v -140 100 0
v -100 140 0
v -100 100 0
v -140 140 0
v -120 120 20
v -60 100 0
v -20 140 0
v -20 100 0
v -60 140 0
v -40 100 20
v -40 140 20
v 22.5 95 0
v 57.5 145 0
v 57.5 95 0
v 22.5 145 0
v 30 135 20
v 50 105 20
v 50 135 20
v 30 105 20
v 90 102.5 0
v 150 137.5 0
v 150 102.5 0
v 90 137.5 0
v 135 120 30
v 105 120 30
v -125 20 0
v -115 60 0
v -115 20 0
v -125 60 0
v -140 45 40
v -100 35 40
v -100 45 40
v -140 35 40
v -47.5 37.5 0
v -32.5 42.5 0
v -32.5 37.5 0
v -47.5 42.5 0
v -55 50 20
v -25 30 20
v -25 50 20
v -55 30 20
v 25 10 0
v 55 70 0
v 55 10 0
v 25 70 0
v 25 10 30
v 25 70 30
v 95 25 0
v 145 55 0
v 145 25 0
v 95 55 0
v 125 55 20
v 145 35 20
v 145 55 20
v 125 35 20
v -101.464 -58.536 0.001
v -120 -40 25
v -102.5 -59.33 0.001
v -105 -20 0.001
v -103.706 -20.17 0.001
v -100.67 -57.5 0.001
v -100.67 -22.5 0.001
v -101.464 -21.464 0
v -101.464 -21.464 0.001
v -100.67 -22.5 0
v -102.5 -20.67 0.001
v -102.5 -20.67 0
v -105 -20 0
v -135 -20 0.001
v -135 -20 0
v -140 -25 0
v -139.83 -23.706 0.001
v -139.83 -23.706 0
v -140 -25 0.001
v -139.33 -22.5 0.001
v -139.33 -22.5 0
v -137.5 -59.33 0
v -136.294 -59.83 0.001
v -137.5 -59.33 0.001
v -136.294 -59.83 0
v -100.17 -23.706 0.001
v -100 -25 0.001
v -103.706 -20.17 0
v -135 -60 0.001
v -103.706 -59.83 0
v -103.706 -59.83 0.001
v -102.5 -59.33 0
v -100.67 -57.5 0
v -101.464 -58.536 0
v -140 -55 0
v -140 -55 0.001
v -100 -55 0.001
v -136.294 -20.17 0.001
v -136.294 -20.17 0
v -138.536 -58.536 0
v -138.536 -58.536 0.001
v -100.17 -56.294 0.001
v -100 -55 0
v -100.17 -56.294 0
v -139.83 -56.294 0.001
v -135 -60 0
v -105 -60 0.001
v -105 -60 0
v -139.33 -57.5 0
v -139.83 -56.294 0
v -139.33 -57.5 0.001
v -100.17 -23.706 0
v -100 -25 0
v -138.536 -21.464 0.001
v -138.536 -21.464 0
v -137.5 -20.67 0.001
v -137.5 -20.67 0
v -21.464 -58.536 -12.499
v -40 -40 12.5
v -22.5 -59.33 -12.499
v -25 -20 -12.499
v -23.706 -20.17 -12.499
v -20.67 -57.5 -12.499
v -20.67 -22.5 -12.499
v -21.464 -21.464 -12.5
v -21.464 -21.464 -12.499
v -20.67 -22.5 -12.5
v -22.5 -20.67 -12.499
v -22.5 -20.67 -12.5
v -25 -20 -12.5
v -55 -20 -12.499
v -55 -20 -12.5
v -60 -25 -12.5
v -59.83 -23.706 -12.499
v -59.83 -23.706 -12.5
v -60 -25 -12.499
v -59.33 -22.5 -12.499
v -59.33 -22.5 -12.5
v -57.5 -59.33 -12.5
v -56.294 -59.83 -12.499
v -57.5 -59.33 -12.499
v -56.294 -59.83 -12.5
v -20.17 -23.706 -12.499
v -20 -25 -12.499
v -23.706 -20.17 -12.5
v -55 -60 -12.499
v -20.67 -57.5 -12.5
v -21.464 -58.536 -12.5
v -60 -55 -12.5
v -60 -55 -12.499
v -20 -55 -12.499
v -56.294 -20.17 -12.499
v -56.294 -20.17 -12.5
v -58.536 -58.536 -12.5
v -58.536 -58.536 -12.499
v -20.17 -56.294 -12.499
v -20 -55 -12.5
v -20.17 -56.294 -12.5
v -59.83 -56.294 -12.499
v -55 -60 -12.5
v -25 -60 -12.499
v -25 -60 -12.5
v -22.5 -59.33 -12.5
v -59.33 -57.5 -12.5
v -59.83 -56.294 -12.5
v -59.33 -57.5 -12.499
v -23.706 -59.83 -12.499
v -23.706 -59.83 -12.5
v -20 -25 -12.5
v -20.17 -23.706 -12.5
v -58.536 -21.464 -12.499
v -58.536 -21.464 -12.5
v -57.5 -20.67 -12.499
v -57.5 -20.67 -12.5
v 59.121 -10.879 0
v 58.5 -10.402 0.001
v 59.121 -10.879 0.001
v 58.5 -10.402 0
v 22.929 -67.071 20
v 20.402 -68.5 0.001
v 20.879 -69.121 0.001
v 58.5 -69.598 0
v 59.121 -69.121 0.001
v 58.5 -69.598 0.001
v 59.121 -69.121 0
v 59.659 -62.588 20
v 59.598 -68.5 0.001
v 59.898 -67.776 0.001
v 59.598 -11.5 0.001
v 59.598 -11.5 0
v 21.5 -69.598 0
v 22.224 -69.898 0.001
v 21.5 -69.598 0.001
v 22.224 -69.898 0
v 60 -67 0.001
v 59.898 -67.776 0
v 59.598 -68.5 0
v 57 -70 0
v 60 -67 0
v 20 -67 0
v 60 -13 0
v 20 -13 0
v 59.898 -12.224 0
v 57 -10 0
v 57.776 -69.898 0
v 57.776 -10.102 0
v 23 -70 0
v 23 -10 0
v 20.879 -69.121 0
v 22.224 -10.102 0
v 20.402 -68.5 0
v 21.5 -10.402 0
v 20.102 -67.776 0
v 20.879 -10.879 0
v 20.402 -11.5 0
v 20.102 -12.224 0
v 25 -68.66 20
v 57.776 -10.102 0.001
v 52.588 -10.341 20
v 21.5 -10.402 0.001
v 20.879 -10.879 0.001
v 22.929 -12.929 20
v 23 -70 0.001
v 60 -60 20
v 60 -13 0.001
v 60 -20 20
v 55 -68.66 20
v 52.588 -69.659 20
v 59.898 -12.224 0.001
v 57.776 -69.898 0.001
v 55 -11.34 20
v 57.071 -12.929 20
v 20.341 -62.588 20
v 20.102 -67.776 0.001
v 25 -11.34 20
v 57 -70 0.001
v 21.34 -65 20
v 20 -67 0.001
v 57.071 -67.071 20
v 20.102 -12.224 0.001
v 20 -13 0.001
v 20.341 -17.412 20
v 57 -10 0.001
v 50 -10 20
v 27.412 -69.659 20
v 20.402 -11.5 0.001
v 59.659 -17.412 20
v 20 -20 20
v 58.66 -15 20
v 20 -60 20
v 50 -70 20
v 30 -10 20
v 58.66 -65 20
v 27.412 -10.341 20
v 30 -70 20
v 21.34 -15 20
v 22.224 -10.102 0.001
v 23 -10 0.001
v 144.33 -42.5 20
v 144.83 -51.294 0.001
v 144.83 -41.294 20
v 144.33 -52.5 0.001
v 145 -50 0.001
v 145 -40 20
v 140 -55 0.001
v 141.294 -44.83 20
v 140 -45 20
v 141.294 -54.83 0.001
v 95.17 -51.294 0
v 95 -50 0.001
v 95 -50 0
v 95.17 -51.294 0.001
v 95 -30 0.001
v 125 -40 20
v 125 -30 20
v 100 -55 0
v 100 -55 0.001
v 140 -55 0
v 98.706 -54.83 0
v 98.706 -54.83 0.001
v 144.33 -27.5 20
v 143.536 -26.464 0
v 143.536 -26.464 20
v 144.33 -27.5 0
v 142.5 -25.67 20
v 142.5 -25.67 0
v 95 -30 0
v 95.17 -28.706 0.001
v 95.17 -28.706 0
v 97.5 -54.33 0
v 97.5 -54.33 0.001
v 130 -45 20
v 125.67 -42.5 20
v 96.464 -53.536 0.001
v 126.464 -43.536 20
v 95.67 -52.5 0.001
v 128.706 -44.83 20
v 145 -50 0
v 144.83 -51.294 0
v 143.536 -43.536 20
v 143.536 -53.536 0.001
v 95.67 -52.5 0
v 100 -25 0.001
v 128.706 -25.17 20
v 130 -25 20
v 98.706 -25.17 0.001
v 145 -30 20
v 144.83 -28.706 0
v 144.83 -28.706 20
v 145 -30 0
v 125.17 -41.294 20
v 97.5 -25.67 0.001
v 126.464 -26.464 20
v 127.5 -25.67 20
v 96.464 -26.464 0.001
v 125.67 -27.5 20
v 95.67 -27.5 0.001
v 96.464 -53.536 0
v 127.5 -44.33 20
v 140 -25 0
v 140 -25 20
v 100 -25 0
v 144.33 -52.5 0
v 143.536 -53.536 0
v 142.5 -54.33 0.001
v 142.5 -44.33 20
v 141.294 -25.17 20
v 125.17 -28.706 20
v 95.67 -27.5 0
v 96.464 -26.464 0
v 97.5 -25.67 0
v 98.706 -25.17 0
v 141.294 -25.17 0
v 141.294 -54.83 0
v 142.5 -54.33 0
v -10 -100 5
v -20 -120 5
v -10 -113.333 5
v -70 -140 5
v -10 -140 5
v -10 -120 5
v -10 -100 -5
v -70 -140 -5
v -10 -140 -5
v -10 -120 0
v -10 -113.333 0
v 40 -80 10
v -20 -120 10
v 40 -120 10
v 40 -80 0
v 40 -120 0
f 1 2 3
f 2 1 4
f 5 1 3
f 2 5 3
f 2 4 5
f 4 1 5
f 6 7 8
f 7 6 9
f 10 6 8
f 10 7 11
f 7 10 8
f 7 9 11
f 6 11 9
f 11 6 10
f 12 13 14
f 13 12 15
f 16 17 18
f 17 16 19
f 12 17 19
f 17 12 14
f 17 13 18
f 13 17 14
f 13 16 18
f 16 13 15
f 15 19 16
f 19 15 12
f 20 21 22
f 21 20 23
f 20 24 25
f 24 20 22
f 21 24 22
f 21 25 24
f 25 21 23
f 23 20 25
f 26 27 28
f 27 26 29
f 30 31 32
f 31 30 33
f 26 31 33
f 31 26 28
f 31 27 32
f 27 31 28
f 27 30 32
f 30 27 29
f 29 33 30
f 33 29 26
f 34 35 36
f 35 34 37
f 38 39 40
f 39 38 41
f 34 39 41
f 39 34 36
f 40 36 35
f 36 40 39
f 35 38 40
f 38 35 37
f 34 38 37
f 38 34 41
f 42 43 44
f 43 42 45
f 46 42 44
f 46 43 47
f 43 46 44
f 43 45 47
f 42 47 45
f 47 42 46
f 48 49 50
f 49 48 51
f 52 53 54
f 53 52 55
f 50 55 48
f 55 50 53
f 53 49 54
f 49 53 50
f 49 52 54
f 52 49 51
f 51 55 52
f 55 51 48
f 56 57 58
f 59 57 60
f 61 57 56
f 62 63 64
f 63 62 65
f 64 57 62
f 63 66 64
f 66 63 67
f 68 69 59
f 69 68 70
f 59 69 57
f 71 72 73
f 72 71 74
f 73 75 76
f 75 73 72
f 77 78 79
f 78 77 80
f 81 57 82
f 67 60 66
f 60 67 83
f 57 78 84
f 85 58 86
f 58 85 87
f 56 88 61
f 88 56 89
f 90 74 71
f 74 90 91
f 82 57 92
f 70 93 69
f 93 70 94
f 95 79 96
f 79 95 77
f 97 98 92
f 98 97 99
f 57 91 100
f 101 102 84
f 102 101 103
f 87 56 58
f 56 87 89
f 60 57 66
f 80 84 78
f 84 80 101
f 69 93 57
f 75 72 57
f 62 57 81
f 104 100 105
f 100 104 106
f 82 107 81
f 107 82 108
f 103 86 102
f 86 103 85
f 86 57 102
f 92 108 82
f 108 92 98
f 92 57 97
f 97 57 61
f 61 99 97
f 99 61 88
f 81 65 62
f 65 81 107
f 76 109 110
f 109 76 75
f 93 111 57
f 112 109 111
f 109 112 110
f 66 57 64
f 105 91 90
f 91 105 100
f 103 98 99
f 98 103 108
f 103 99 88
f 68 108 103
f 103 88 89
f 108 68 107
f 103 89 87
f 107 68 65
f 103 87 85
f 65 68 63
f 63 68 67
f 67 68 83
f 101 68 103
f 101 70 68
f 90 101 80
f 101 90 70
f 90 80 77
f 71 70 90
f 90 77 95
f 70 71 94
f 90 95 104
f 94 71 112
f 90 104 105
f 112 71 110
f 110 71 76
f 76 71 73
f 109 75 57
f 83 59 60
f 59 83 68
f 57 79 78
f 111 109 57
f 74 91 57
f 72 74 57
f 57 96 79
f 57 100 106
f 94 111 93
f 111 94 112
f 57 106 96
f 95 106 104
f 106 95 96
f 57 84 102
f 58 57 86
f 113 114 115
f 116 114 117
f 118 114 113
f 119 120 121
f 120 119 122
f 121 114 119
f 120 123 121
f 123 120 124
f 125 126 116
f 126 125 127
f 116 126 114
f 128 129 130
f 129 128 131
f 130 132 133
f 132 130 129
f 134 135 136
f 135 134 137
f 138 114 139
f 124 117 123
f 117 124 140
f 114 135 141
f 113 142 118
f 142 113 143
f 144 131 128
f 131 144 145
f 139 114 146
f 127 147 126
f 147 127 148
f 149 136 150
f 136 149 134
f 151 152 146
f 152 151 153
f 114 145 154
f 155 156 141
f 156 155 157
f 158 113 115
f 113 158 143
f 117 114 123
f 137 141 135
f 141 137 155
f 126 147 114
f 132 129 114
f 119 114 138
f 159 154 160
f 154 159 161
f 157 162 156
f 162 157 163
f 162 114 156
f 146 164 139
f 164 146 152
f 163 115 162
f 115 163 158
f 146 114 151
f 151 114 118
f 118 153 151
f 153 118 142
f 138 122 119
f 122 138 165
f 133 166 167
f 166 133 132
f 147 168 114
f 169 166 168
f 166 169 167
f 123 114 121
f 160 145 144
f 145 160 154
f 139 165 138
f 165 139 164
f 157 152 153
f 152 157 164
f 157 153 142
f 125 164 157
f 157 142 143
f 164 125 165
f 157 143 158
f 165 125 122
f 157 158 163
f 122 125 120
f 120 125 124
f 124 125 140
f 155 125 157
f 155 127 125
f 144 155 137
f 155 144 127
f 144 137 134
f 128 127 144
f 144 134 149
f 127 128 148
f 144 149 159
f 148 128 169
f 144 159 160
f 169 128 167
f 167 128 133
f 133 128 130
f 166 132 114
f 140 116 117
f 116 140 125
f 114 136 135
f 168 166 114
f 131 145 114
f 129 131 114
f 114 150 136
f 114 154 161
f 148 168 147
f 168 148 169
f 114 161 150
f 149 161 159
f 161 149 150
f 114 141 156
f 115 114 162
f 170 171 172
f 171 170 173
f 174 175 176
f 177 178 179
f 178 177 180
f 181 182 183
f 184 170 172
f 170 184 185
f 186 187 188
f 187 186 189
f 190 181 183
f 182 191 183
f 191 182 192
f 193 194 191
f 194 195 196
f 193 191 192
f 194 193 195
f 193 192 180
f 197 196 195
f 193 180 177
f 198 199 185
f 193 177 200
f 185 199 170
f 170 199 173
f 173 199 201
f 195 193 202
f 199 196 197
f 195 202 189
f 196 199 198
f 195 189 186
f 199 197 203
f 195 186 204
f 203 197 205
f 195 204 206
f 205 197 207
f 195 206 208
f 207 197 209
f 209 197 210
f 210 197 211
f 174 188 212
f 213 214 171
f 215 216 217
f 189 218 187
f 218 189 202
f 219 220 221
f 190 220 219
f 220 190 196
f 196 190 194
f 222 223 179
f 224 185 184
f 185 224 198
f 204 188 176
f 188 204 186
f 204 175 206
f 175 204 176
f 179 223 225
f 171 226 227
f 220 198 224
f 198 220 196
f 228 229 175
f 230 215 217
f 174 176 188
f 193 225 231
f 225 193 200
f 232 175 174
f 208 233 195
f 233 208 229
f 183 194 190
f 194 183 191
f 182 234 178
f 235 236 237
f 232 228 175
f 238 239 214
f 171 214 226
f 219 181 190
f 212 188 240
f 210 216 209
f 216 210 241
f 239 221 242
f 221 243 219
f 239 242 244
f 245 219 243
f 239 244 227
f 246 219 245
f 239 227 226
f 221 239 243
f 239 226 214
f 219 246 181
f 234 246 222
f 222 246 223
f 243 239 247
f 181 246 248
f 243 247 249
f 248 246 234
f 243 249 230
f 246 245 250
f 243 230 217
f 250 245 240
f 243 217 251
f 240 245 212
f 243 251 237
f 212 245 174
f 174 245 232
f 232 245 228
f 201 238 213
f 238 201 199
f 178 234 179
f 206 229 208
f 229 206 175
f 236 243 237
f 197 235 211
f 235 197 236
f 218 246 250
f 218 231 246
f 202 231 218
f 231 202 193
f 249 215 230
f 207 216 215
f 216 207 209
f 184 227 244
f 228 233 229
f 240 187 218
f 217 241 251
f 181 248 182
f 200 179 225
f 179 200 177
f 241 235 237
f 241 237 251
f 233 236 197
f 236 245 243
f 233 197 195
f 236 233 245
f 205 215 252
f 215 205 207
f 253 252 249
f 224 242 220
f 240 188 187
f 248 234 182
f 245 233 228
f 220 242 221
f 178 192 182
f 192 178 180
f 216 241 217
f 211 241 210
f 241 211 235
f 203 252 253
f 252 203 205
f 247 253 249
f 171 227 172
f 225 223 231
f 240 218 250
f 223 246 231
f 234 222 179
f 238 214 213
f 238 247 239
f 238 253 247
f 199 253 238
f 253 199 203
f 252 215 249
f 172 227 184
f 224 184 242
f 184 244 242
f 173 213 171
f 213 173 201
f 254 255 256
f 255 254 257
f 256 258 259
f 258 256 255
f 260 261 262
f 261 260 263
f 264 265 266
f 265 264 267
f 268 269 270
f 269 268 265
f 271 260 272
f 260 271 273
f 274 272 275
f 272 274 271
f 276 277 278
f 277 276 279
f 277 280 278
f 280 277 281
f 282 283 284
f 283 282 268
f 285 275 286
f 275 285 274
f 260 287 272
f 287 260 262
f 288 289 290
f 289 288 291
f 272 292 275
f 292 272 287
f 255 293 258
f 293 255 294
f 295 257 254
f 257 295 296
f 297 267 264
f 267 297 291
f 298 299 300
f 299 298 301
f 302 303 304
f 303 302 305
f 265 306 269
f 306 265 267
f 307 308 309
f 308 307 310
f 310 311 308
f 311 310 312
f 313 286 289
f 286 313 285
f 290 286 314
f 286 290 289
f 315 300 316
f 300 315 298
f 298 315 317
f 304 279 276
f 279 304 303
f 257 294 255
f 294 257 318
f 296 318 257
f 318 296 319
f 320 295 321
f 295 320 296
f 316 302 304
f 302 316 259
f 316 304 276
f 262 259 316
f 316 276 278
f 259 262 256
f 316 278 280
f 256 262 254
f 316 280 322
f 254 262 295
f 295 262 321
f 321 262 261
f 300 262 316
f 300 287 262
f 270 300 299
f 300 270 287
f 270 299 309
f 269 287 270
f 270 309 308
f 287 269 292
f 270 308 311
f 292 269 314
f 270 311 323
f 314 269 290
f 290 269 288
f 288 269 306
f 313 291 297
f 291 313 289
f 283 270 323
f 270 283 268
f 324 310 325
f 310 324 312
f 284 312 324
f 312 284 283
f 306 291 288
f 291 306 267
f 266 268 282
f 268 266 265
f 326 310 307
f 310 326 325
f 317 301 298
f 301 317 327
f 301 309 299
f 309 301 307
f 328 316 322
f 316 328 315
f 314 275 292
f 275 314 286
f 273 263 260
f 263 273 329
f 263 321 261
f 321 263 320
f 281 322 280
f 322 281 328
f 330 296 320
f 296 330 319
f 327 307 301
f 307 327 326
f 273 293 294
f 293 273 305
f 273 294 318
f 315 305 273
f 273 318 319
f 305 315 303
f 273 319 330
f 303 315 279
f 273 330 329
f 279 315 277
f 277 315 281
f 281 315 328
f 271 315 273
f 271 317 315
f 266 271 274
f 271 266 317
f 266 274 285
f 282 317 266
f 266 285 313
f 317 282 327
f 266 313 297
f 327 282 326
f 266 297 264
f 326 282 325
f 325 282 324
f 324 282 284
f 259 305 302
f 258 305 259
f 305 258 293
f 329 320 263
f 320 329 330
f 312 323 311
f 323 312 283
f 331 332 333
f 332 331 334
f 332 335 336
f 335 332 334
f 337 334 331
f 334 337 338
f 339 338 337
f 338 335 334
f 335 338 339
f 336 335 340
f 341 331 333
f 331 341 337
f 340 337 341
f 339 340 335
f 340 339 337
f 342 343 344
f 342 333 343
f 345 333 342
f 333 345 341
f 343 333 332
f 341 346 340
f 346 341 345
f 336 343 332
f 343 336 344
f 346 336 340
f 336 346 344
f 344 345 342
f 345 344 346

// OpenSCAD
// file: GEOL/shapes.scad
// GEOL (Geometric Engine Optimized Library) - Shapes Module
// Custom geometric primitive shapes and advanced structured solids built natively.
// Created: 2026-05-18

// ==========================================
// Directional Vectors & Orientation Constants
// ==========================================
V_LEFT   = [-1,  0,  0];
V_RIGHT  = [ 1,  0,  0];
V_FWD    = [ 0, -1,  0];
V_BACK   = [ 0,  1,  0];
V_DOWN   = [ 0,  0, -1];
V_UP     = [ 0,  0,  1];
V_CENTER = [ 0,  0,  0];

ORIENT_X = [90,  0,  90];
ORIENT_Y = [90,  0, 180];
ORIENT_Z = [ 0,  0,   0];

ALIGN_POS    = 1;
ALIGN_NEG    = -1;
ALIGN_CENTER = 0;

// Helper to check if a variable is defined
function is_def(v) = (v != undef);

// 1. Hexagonal Prism
module hexagon(d=10, h=5) {
    cylinder(d=d, h=h, center=true, $fn=6);
}

// 2. Star 2D Profile
module star_2d(r_outer=10, r_inner=5, points=5) {
    polygon(points=[
        for (i = [0 : points * 2 - 1])
            let (r = (i % 2 == 0) ? r_outer : r_inner)
            let (a = i * (180 / points))
            [r * cos(a), r * sin(a)]
    ]);
}

// 3. Twisted Star Column
module star_column(h=20, r_outer=10, r_inner=5, points=5, twist=90, scale=1.0, slices=40) {
    linear_extrude(height=h, twist=twist, scale=scale, slices=slices, center=true) {
        star_2d(r_outer=r_outer, r_inner=r_inner, points=points);
    }
}

// 4. Beveled Cube (Vertical edges chamfered)
module beveled_cube(size=[10, 10, 10], chamfer=1) {
    dx = size[0] / 2;
    dy = size[1] / 2;
    dz = size[2] / 2;
    
    difference() {
        cube(size, center=true);
        // Subtract 4 vertical corner chamfer cutters
        for (x = [-dx, dx]) {
            for (y = [-dy, dy]) {
                translate([x, y, 0]) {
                    rotate([0, 0, 45]) {
                        cube([chamfer * 1.414, chamfer * 1.414, size[2] + 2], center=true);
                    }
                }
            }
        }
    }
}

// 5. Rounded Cube (Vertical edges filleted)
module rounded_cube(size=[10, 10, 10], fillet=1) {
    dx = size[0] / 2;
    dy = size[1] / 2;
    dz = size[2] / 2;
    
    difference() {
        cube(size, center=true);
        // Subtract 4 vertical corner fillet cutters
        for (x = [-1, 1]) {
            for (y = [-1, 1]) {
                translate([x * (dx - fillet), y * (dy - fillet), -dz - 1]) {
                    difference() {
                        // The solid bounding box for the cutter
                        translate([x * fillet / 2, y * fillet / 2, dz + 1]) {
                            cube([fillet * 1.05, fillet * 1.05, size[2] + 4], center=true);
                        }
                        // Subtract the cylinder to leave the concave corner cutter
                        cylinder(r=fillet, h=size[2] + 4, $fn=32);
                    }
                }
            }
        }
    }
}

// 6. Prismoid
module prismoid(size1=[10,10], size2=[5,5], h=10, shift=[0,0], orient=ORIENT_Z, align=undef, center=undef) {
    // Determine alignment
    local_align = is_def(center) ? (center ? V_CENTER : [0, 0, 1]) : (is_def(align) ? align : [0, 0, 1]);
    
    // Z shift based on vertical centering
    z_shift = (local_align == V_CENTER || local_align == [0,0,0]) ? 0 : h/2;
    
    s = is_def(shift) ? shift : [0, 0];
    
    w1 = size1[0];
    l1 = size1[1];
    w2 = size2[0];
    l2 = size2[1];
    
    p0 = [-w1/2, -l1/2, -h/2];
    p1 = [ w1/2, -l1/2, -h/2];
    p2 = [ w1/2,  l1/2, -h/2];
    p3 = [-w1/2,  l1/2, -h/2];
    
    p4 = [-w2/2 + s[0], -l2/2 + s[1], h/2];
    p5 = [ w2/2 + s[0], -l2/2 + s[1], h/2];
    p6 = [ w2/2 + s[0],  l2/2 + s[1], h/2];
    p7 = [-w2/2 + s[0],  l2/2 + s[1], h/2];
    
    points = [p0, p1, p2, p3, p4, p5, p6, p7];
    faces = [
        [3, 2, 1, 0], // Bottom
        [4, 5, 6, 7], // Top
        [0, 1, 5, 4], // Front
        [1, 2, 6, 5], // Right
        [2, 3, 7, 6], // Back
        [3, 0, 4, 7]  // Left
    ];
    
    rotate(orient) {
        translate([0, 0, z_shift]) {
            polyhedron(points=points, faces=faces);
        }
    }
}

// Helper module for rounded_prismoid 2D profile
module rounded_rect_2d(w, l, r) {
    if (w <= 0.001 || l <= 0.001) {
        circle(r=0.0001);
    } else {
        actual_r = is_def(r) ? r : 0;
        if (actual_r <= 0.001) {
            square([w, l], center=true);
        } else {
            max_r = min(actual_r, w/2, l/2);
            hull() {
                dx = w/2 - max_r;
                dy = l/2 - max_r;
                for (x = [-dx, dx]) {
                    for (y = [-dy, dy]) {
                        translate([x, y]) circle(r=max_r);
                    }
                }
            }
        }
    }
}

// 7. Rounded Prismoid
module rounded_prismoid(size1=[10,10], size2=[5,5], h=10, r=undef, r1=undef, r2=undef, shift=[0,0], orient=ORIENT_Z, align=undef, center=undef) {
    rad1 = is_def(r1) ? r1 : (is_def(r) ? r : 0);
    rad2 = is_def(r2) ? r2 : (is_def(r) ? r : 0);
    
    local_align = is_def(center) ? (center ? V_CENTER : [0, 0, 1]) : (is_def(align) ? align : [0, 0, 1]);
    z_shift = (local_align == V_CENTER || local_align == [0,0,0]) ? 0 : h/2;
    
    s = is_def(shift) ? shift : [0, 0];
    
    w1 = size1[0];
    l1 = size1[1];
    w2 = size2[0];
    l2 = size2[1];
    
    rotate(orient) {
        translate([0, 0, z_shift]) {
            hull() {
                translate([0, 0, -h/2 + 0.0005]) {
                    linear_extrude(height=0.001, center=true) {
                        rounded_rect_2d(w1, l1, rad1);
                    }
                }
                translate([s[0], s[1], h/2 - 0.0005]) {
                    linear_extrude(height=0.001, center=true) {
                        rounded_rect_2d(w2, l2, rad2);
                    }
                }
            }
        }
    }
}

// 8. Right Triangle Prism
module right_triangle(size=[10,10,10], orient=ORIENT_Y, align=undef, center=undef) {
    w = size[0];
    t = size[1];
    h = size[2];
    
    local_align = is_def(center) ? (center ? V_CENTER : [1, 1, 1]) : (is_def(align) ? align : [1, 1, 1]);
    
    tx = (local_align[0] - 1) * w / 2;
    ty = (local_align[1] - 1) * t / 2;
    tz = (local_align[2] - 1) * h / 2;
    
    rotate(orient) {
        translate([tx, ty, tz]) {
            translate([0, t/2, 0]) {
                rotate([90, 0, 0]) {
                    linear_extrude(height=t, center=true) {
                        polygon(points=[[0,0], [w,0], [0,h]]);
                    }
                }
            }
        }
    }
}
// file: GEOL/transforms.scad
// GEOL (Geometric Engine Optimized Library) - Transforms Module
// Highly optimized, library-free transformation shortcuts and distribution patterns.
// Created: 2026-05-18

// 1. Translation shortcut
module move(x=0, y=0, z=0) {
    translate([x, y, z]) children();
}

// 2. Rotation shortcuts
module xrot(a=0) {
    rotate([a, 0, 0]) children();
}

module yrot(a=0) {
    rotate([0, a, 0]) children();
}

module zrot(a=0) {
    rotate([0, 0, a]) children();
}

// 3. Mirroring helpers (retains original and adds mirrored child)
module mirror_x() {
    children();
    mirror([1, 0, 0]) children();
}

module mirror_y() {
    children();
    mirror([0, 1, 0]) children();
}

module mirror_z() {
    children();
    mirror([0, 0, 1]) children();
}

// 4. Grid Distribution Grid Spread
module grid_spread(spacing_x=20, spacing_y=20, count_x=2, count_y=2) {
    start_x = -((count_x - 1) * spacing_x) / 2;
    start_y = -((count_y - 1) * spacing_y) / 2;
    
    for (i = [0 : count_x - 1]) {
        for (j = [0 : count_y - 1]) {
            translate([start_x + i * spacing_x, start_y + j * spacing_y, 0]) {
                children();
            }
        }
    }
}

// 5. Radial Distribution
module radial_spread(r=10, count=6) {
    for (i = [0 : count - 1]) {
        angle = i * (360 / count);
        rotate([0, 0, angle]) {
            translate([r, 0, 0]) {
                children();
            }
        }
    }
}
// main file
// GEOL (Geometric Engine Optimized Library) - Prismoids and Right Triangles Showcase
// Demonstrates native, high-performance prismoid, rounded prismoid, and right triangle modules.
// Created: 2026-05-18

use <GEOL/transforms.scad>
use <GEOL/shapes.scad>

$fn = 24;

// ==========================================================
// GRID ARRANGEMENT OF ALL USER EXAMPLES (Grid Spacing: 80mm)
// ==========================================================

// --- Row 1: Prismoids 1 to 4 ---

// Example 1: Rectangular Pyramid
echo("--- Example 1: Rectangular Pyramid ---");
translate([-120, 120, 0]) {
    color("crimson") {
        prismoid(size1=[40,40], size2=[0,0], h=20);
    }
}

// Example 2: Prism
echo("--- Example 2: Prism ---");
translate([-40, 120, 0]) {
    color("dodgerblue") {
        prismoid(size1=[40,40], size2=[0,40], h=20);
    }
}

// Example 3: Truncated Pyramid
echo("--- Example 3: Truncated Pyramid ---");
translate([40, 120, 0]) {
    color("gold") {
        prismoid(size1=[35,50], size2=[20,30], h=20);
    }
}

// Example 4: Wedge
echo("--- Example 4: Wedge ---");
translate([120, 120, 0]) {
    color("forestgreen") {
        prismoid(size1=[60,35], size2=[30,0], h=30);
    }
}


// --- Row 2: Prismoids 5 to 8 ---

// Example 5: Truncated Tetrahedron
echo("--- Example 5: Truncated Tetrahedron ---");
translate([-120, 40, 0]) {
    color("orchid") {
        prismoid(size1=[10,40], size2=[40,10], h=40);
    }
}

// Example 6: Inverted Truncated Pyramid
echo("--- Example 6: Inverted Truncated Pyramid ---");
translate([-40, 40, 0]) {
    color("orange") {
        prismoid(size1=[15,5], size2=[30,20], h=20);
    }
}

// Example 7: Right Prism
echo("--- Example 7: Right Prism ---");
translate([40, 40, 0]) {
    color("darkturquoise") {
        prismoid(size1=[30,60], size2=[0,60], shift=[-15,0], h=30);
    }
}

// Example 8: Shifting/Skewing
echo("--- Example 8: Shifting/Skewing ---");
translate([120, 40, 0]) {
    color("magenta") {
        prismoid(size1=[50,30], size2=[20,20], h=20, shift=[15,5]);
    }
}


// --- Row 3: Rounded Prismoids 1 to 4 ---

// Rounded Example 1: Rounded Pyramid
echo("--- Rounded Example 1: Rounded Pyramid ---");
translate([-120, -40, 0]) {
    color("teal") {
        rounded_prismoid(size1=[40,40], size2=[0,0], h=25, r=5);
    }
}

// Rounded Example 2: Centered Rounded Pyramid
echo("--- Rounded Example 2: Centered Rounded Pyramid ---");
translate([-40, -40, 0]) {
    color("blueviolet") {
        rounded_prismoid(size1=[40,40], size2=[0,0], h=25, r=5, center=true);
    }
}

// Rounded Example 3: Disparate Top and Bottom Radii
echo("--- Rounded Example 3: Disparate Top and Bottom Radii ---");
translate([40, -40, 0]) {
    color("coral") {
        rounded_prismoid(size1=[40,60], size2=[40,60], h=20, r1=3, r2=10, $fn=24);
    }
}

// Rounded Example 4: Shifting/Skewing
echo("--- Rounded Example 4: Shifting/Skewing ---");
translate([120, -40, 0]) {
    color("limegreen") {
        rounded_prismoid(size1=[50,30], size2=[20,20], h=20, shift=[15,5], r=5);
    }
}


// --- Row 4: Right Triangles 1 and 2 ---

// Right Triangle Example 1: Centered
echo("--- Right Triangle Example 1: Centered ---");
translate([-40, -120, 0]) {
    color("yellowgreen") {
        right_triangle([60, 10, 40], center=true);
    }
}

// Right Triangle Example 2: Non-Centered
echo("--- Right Triangle Example 2: Non-Centered ---");
translate([40, -120, 0]) {
    color("tomato") {
        right_triangle([60, 10, 40]);
    }
}
